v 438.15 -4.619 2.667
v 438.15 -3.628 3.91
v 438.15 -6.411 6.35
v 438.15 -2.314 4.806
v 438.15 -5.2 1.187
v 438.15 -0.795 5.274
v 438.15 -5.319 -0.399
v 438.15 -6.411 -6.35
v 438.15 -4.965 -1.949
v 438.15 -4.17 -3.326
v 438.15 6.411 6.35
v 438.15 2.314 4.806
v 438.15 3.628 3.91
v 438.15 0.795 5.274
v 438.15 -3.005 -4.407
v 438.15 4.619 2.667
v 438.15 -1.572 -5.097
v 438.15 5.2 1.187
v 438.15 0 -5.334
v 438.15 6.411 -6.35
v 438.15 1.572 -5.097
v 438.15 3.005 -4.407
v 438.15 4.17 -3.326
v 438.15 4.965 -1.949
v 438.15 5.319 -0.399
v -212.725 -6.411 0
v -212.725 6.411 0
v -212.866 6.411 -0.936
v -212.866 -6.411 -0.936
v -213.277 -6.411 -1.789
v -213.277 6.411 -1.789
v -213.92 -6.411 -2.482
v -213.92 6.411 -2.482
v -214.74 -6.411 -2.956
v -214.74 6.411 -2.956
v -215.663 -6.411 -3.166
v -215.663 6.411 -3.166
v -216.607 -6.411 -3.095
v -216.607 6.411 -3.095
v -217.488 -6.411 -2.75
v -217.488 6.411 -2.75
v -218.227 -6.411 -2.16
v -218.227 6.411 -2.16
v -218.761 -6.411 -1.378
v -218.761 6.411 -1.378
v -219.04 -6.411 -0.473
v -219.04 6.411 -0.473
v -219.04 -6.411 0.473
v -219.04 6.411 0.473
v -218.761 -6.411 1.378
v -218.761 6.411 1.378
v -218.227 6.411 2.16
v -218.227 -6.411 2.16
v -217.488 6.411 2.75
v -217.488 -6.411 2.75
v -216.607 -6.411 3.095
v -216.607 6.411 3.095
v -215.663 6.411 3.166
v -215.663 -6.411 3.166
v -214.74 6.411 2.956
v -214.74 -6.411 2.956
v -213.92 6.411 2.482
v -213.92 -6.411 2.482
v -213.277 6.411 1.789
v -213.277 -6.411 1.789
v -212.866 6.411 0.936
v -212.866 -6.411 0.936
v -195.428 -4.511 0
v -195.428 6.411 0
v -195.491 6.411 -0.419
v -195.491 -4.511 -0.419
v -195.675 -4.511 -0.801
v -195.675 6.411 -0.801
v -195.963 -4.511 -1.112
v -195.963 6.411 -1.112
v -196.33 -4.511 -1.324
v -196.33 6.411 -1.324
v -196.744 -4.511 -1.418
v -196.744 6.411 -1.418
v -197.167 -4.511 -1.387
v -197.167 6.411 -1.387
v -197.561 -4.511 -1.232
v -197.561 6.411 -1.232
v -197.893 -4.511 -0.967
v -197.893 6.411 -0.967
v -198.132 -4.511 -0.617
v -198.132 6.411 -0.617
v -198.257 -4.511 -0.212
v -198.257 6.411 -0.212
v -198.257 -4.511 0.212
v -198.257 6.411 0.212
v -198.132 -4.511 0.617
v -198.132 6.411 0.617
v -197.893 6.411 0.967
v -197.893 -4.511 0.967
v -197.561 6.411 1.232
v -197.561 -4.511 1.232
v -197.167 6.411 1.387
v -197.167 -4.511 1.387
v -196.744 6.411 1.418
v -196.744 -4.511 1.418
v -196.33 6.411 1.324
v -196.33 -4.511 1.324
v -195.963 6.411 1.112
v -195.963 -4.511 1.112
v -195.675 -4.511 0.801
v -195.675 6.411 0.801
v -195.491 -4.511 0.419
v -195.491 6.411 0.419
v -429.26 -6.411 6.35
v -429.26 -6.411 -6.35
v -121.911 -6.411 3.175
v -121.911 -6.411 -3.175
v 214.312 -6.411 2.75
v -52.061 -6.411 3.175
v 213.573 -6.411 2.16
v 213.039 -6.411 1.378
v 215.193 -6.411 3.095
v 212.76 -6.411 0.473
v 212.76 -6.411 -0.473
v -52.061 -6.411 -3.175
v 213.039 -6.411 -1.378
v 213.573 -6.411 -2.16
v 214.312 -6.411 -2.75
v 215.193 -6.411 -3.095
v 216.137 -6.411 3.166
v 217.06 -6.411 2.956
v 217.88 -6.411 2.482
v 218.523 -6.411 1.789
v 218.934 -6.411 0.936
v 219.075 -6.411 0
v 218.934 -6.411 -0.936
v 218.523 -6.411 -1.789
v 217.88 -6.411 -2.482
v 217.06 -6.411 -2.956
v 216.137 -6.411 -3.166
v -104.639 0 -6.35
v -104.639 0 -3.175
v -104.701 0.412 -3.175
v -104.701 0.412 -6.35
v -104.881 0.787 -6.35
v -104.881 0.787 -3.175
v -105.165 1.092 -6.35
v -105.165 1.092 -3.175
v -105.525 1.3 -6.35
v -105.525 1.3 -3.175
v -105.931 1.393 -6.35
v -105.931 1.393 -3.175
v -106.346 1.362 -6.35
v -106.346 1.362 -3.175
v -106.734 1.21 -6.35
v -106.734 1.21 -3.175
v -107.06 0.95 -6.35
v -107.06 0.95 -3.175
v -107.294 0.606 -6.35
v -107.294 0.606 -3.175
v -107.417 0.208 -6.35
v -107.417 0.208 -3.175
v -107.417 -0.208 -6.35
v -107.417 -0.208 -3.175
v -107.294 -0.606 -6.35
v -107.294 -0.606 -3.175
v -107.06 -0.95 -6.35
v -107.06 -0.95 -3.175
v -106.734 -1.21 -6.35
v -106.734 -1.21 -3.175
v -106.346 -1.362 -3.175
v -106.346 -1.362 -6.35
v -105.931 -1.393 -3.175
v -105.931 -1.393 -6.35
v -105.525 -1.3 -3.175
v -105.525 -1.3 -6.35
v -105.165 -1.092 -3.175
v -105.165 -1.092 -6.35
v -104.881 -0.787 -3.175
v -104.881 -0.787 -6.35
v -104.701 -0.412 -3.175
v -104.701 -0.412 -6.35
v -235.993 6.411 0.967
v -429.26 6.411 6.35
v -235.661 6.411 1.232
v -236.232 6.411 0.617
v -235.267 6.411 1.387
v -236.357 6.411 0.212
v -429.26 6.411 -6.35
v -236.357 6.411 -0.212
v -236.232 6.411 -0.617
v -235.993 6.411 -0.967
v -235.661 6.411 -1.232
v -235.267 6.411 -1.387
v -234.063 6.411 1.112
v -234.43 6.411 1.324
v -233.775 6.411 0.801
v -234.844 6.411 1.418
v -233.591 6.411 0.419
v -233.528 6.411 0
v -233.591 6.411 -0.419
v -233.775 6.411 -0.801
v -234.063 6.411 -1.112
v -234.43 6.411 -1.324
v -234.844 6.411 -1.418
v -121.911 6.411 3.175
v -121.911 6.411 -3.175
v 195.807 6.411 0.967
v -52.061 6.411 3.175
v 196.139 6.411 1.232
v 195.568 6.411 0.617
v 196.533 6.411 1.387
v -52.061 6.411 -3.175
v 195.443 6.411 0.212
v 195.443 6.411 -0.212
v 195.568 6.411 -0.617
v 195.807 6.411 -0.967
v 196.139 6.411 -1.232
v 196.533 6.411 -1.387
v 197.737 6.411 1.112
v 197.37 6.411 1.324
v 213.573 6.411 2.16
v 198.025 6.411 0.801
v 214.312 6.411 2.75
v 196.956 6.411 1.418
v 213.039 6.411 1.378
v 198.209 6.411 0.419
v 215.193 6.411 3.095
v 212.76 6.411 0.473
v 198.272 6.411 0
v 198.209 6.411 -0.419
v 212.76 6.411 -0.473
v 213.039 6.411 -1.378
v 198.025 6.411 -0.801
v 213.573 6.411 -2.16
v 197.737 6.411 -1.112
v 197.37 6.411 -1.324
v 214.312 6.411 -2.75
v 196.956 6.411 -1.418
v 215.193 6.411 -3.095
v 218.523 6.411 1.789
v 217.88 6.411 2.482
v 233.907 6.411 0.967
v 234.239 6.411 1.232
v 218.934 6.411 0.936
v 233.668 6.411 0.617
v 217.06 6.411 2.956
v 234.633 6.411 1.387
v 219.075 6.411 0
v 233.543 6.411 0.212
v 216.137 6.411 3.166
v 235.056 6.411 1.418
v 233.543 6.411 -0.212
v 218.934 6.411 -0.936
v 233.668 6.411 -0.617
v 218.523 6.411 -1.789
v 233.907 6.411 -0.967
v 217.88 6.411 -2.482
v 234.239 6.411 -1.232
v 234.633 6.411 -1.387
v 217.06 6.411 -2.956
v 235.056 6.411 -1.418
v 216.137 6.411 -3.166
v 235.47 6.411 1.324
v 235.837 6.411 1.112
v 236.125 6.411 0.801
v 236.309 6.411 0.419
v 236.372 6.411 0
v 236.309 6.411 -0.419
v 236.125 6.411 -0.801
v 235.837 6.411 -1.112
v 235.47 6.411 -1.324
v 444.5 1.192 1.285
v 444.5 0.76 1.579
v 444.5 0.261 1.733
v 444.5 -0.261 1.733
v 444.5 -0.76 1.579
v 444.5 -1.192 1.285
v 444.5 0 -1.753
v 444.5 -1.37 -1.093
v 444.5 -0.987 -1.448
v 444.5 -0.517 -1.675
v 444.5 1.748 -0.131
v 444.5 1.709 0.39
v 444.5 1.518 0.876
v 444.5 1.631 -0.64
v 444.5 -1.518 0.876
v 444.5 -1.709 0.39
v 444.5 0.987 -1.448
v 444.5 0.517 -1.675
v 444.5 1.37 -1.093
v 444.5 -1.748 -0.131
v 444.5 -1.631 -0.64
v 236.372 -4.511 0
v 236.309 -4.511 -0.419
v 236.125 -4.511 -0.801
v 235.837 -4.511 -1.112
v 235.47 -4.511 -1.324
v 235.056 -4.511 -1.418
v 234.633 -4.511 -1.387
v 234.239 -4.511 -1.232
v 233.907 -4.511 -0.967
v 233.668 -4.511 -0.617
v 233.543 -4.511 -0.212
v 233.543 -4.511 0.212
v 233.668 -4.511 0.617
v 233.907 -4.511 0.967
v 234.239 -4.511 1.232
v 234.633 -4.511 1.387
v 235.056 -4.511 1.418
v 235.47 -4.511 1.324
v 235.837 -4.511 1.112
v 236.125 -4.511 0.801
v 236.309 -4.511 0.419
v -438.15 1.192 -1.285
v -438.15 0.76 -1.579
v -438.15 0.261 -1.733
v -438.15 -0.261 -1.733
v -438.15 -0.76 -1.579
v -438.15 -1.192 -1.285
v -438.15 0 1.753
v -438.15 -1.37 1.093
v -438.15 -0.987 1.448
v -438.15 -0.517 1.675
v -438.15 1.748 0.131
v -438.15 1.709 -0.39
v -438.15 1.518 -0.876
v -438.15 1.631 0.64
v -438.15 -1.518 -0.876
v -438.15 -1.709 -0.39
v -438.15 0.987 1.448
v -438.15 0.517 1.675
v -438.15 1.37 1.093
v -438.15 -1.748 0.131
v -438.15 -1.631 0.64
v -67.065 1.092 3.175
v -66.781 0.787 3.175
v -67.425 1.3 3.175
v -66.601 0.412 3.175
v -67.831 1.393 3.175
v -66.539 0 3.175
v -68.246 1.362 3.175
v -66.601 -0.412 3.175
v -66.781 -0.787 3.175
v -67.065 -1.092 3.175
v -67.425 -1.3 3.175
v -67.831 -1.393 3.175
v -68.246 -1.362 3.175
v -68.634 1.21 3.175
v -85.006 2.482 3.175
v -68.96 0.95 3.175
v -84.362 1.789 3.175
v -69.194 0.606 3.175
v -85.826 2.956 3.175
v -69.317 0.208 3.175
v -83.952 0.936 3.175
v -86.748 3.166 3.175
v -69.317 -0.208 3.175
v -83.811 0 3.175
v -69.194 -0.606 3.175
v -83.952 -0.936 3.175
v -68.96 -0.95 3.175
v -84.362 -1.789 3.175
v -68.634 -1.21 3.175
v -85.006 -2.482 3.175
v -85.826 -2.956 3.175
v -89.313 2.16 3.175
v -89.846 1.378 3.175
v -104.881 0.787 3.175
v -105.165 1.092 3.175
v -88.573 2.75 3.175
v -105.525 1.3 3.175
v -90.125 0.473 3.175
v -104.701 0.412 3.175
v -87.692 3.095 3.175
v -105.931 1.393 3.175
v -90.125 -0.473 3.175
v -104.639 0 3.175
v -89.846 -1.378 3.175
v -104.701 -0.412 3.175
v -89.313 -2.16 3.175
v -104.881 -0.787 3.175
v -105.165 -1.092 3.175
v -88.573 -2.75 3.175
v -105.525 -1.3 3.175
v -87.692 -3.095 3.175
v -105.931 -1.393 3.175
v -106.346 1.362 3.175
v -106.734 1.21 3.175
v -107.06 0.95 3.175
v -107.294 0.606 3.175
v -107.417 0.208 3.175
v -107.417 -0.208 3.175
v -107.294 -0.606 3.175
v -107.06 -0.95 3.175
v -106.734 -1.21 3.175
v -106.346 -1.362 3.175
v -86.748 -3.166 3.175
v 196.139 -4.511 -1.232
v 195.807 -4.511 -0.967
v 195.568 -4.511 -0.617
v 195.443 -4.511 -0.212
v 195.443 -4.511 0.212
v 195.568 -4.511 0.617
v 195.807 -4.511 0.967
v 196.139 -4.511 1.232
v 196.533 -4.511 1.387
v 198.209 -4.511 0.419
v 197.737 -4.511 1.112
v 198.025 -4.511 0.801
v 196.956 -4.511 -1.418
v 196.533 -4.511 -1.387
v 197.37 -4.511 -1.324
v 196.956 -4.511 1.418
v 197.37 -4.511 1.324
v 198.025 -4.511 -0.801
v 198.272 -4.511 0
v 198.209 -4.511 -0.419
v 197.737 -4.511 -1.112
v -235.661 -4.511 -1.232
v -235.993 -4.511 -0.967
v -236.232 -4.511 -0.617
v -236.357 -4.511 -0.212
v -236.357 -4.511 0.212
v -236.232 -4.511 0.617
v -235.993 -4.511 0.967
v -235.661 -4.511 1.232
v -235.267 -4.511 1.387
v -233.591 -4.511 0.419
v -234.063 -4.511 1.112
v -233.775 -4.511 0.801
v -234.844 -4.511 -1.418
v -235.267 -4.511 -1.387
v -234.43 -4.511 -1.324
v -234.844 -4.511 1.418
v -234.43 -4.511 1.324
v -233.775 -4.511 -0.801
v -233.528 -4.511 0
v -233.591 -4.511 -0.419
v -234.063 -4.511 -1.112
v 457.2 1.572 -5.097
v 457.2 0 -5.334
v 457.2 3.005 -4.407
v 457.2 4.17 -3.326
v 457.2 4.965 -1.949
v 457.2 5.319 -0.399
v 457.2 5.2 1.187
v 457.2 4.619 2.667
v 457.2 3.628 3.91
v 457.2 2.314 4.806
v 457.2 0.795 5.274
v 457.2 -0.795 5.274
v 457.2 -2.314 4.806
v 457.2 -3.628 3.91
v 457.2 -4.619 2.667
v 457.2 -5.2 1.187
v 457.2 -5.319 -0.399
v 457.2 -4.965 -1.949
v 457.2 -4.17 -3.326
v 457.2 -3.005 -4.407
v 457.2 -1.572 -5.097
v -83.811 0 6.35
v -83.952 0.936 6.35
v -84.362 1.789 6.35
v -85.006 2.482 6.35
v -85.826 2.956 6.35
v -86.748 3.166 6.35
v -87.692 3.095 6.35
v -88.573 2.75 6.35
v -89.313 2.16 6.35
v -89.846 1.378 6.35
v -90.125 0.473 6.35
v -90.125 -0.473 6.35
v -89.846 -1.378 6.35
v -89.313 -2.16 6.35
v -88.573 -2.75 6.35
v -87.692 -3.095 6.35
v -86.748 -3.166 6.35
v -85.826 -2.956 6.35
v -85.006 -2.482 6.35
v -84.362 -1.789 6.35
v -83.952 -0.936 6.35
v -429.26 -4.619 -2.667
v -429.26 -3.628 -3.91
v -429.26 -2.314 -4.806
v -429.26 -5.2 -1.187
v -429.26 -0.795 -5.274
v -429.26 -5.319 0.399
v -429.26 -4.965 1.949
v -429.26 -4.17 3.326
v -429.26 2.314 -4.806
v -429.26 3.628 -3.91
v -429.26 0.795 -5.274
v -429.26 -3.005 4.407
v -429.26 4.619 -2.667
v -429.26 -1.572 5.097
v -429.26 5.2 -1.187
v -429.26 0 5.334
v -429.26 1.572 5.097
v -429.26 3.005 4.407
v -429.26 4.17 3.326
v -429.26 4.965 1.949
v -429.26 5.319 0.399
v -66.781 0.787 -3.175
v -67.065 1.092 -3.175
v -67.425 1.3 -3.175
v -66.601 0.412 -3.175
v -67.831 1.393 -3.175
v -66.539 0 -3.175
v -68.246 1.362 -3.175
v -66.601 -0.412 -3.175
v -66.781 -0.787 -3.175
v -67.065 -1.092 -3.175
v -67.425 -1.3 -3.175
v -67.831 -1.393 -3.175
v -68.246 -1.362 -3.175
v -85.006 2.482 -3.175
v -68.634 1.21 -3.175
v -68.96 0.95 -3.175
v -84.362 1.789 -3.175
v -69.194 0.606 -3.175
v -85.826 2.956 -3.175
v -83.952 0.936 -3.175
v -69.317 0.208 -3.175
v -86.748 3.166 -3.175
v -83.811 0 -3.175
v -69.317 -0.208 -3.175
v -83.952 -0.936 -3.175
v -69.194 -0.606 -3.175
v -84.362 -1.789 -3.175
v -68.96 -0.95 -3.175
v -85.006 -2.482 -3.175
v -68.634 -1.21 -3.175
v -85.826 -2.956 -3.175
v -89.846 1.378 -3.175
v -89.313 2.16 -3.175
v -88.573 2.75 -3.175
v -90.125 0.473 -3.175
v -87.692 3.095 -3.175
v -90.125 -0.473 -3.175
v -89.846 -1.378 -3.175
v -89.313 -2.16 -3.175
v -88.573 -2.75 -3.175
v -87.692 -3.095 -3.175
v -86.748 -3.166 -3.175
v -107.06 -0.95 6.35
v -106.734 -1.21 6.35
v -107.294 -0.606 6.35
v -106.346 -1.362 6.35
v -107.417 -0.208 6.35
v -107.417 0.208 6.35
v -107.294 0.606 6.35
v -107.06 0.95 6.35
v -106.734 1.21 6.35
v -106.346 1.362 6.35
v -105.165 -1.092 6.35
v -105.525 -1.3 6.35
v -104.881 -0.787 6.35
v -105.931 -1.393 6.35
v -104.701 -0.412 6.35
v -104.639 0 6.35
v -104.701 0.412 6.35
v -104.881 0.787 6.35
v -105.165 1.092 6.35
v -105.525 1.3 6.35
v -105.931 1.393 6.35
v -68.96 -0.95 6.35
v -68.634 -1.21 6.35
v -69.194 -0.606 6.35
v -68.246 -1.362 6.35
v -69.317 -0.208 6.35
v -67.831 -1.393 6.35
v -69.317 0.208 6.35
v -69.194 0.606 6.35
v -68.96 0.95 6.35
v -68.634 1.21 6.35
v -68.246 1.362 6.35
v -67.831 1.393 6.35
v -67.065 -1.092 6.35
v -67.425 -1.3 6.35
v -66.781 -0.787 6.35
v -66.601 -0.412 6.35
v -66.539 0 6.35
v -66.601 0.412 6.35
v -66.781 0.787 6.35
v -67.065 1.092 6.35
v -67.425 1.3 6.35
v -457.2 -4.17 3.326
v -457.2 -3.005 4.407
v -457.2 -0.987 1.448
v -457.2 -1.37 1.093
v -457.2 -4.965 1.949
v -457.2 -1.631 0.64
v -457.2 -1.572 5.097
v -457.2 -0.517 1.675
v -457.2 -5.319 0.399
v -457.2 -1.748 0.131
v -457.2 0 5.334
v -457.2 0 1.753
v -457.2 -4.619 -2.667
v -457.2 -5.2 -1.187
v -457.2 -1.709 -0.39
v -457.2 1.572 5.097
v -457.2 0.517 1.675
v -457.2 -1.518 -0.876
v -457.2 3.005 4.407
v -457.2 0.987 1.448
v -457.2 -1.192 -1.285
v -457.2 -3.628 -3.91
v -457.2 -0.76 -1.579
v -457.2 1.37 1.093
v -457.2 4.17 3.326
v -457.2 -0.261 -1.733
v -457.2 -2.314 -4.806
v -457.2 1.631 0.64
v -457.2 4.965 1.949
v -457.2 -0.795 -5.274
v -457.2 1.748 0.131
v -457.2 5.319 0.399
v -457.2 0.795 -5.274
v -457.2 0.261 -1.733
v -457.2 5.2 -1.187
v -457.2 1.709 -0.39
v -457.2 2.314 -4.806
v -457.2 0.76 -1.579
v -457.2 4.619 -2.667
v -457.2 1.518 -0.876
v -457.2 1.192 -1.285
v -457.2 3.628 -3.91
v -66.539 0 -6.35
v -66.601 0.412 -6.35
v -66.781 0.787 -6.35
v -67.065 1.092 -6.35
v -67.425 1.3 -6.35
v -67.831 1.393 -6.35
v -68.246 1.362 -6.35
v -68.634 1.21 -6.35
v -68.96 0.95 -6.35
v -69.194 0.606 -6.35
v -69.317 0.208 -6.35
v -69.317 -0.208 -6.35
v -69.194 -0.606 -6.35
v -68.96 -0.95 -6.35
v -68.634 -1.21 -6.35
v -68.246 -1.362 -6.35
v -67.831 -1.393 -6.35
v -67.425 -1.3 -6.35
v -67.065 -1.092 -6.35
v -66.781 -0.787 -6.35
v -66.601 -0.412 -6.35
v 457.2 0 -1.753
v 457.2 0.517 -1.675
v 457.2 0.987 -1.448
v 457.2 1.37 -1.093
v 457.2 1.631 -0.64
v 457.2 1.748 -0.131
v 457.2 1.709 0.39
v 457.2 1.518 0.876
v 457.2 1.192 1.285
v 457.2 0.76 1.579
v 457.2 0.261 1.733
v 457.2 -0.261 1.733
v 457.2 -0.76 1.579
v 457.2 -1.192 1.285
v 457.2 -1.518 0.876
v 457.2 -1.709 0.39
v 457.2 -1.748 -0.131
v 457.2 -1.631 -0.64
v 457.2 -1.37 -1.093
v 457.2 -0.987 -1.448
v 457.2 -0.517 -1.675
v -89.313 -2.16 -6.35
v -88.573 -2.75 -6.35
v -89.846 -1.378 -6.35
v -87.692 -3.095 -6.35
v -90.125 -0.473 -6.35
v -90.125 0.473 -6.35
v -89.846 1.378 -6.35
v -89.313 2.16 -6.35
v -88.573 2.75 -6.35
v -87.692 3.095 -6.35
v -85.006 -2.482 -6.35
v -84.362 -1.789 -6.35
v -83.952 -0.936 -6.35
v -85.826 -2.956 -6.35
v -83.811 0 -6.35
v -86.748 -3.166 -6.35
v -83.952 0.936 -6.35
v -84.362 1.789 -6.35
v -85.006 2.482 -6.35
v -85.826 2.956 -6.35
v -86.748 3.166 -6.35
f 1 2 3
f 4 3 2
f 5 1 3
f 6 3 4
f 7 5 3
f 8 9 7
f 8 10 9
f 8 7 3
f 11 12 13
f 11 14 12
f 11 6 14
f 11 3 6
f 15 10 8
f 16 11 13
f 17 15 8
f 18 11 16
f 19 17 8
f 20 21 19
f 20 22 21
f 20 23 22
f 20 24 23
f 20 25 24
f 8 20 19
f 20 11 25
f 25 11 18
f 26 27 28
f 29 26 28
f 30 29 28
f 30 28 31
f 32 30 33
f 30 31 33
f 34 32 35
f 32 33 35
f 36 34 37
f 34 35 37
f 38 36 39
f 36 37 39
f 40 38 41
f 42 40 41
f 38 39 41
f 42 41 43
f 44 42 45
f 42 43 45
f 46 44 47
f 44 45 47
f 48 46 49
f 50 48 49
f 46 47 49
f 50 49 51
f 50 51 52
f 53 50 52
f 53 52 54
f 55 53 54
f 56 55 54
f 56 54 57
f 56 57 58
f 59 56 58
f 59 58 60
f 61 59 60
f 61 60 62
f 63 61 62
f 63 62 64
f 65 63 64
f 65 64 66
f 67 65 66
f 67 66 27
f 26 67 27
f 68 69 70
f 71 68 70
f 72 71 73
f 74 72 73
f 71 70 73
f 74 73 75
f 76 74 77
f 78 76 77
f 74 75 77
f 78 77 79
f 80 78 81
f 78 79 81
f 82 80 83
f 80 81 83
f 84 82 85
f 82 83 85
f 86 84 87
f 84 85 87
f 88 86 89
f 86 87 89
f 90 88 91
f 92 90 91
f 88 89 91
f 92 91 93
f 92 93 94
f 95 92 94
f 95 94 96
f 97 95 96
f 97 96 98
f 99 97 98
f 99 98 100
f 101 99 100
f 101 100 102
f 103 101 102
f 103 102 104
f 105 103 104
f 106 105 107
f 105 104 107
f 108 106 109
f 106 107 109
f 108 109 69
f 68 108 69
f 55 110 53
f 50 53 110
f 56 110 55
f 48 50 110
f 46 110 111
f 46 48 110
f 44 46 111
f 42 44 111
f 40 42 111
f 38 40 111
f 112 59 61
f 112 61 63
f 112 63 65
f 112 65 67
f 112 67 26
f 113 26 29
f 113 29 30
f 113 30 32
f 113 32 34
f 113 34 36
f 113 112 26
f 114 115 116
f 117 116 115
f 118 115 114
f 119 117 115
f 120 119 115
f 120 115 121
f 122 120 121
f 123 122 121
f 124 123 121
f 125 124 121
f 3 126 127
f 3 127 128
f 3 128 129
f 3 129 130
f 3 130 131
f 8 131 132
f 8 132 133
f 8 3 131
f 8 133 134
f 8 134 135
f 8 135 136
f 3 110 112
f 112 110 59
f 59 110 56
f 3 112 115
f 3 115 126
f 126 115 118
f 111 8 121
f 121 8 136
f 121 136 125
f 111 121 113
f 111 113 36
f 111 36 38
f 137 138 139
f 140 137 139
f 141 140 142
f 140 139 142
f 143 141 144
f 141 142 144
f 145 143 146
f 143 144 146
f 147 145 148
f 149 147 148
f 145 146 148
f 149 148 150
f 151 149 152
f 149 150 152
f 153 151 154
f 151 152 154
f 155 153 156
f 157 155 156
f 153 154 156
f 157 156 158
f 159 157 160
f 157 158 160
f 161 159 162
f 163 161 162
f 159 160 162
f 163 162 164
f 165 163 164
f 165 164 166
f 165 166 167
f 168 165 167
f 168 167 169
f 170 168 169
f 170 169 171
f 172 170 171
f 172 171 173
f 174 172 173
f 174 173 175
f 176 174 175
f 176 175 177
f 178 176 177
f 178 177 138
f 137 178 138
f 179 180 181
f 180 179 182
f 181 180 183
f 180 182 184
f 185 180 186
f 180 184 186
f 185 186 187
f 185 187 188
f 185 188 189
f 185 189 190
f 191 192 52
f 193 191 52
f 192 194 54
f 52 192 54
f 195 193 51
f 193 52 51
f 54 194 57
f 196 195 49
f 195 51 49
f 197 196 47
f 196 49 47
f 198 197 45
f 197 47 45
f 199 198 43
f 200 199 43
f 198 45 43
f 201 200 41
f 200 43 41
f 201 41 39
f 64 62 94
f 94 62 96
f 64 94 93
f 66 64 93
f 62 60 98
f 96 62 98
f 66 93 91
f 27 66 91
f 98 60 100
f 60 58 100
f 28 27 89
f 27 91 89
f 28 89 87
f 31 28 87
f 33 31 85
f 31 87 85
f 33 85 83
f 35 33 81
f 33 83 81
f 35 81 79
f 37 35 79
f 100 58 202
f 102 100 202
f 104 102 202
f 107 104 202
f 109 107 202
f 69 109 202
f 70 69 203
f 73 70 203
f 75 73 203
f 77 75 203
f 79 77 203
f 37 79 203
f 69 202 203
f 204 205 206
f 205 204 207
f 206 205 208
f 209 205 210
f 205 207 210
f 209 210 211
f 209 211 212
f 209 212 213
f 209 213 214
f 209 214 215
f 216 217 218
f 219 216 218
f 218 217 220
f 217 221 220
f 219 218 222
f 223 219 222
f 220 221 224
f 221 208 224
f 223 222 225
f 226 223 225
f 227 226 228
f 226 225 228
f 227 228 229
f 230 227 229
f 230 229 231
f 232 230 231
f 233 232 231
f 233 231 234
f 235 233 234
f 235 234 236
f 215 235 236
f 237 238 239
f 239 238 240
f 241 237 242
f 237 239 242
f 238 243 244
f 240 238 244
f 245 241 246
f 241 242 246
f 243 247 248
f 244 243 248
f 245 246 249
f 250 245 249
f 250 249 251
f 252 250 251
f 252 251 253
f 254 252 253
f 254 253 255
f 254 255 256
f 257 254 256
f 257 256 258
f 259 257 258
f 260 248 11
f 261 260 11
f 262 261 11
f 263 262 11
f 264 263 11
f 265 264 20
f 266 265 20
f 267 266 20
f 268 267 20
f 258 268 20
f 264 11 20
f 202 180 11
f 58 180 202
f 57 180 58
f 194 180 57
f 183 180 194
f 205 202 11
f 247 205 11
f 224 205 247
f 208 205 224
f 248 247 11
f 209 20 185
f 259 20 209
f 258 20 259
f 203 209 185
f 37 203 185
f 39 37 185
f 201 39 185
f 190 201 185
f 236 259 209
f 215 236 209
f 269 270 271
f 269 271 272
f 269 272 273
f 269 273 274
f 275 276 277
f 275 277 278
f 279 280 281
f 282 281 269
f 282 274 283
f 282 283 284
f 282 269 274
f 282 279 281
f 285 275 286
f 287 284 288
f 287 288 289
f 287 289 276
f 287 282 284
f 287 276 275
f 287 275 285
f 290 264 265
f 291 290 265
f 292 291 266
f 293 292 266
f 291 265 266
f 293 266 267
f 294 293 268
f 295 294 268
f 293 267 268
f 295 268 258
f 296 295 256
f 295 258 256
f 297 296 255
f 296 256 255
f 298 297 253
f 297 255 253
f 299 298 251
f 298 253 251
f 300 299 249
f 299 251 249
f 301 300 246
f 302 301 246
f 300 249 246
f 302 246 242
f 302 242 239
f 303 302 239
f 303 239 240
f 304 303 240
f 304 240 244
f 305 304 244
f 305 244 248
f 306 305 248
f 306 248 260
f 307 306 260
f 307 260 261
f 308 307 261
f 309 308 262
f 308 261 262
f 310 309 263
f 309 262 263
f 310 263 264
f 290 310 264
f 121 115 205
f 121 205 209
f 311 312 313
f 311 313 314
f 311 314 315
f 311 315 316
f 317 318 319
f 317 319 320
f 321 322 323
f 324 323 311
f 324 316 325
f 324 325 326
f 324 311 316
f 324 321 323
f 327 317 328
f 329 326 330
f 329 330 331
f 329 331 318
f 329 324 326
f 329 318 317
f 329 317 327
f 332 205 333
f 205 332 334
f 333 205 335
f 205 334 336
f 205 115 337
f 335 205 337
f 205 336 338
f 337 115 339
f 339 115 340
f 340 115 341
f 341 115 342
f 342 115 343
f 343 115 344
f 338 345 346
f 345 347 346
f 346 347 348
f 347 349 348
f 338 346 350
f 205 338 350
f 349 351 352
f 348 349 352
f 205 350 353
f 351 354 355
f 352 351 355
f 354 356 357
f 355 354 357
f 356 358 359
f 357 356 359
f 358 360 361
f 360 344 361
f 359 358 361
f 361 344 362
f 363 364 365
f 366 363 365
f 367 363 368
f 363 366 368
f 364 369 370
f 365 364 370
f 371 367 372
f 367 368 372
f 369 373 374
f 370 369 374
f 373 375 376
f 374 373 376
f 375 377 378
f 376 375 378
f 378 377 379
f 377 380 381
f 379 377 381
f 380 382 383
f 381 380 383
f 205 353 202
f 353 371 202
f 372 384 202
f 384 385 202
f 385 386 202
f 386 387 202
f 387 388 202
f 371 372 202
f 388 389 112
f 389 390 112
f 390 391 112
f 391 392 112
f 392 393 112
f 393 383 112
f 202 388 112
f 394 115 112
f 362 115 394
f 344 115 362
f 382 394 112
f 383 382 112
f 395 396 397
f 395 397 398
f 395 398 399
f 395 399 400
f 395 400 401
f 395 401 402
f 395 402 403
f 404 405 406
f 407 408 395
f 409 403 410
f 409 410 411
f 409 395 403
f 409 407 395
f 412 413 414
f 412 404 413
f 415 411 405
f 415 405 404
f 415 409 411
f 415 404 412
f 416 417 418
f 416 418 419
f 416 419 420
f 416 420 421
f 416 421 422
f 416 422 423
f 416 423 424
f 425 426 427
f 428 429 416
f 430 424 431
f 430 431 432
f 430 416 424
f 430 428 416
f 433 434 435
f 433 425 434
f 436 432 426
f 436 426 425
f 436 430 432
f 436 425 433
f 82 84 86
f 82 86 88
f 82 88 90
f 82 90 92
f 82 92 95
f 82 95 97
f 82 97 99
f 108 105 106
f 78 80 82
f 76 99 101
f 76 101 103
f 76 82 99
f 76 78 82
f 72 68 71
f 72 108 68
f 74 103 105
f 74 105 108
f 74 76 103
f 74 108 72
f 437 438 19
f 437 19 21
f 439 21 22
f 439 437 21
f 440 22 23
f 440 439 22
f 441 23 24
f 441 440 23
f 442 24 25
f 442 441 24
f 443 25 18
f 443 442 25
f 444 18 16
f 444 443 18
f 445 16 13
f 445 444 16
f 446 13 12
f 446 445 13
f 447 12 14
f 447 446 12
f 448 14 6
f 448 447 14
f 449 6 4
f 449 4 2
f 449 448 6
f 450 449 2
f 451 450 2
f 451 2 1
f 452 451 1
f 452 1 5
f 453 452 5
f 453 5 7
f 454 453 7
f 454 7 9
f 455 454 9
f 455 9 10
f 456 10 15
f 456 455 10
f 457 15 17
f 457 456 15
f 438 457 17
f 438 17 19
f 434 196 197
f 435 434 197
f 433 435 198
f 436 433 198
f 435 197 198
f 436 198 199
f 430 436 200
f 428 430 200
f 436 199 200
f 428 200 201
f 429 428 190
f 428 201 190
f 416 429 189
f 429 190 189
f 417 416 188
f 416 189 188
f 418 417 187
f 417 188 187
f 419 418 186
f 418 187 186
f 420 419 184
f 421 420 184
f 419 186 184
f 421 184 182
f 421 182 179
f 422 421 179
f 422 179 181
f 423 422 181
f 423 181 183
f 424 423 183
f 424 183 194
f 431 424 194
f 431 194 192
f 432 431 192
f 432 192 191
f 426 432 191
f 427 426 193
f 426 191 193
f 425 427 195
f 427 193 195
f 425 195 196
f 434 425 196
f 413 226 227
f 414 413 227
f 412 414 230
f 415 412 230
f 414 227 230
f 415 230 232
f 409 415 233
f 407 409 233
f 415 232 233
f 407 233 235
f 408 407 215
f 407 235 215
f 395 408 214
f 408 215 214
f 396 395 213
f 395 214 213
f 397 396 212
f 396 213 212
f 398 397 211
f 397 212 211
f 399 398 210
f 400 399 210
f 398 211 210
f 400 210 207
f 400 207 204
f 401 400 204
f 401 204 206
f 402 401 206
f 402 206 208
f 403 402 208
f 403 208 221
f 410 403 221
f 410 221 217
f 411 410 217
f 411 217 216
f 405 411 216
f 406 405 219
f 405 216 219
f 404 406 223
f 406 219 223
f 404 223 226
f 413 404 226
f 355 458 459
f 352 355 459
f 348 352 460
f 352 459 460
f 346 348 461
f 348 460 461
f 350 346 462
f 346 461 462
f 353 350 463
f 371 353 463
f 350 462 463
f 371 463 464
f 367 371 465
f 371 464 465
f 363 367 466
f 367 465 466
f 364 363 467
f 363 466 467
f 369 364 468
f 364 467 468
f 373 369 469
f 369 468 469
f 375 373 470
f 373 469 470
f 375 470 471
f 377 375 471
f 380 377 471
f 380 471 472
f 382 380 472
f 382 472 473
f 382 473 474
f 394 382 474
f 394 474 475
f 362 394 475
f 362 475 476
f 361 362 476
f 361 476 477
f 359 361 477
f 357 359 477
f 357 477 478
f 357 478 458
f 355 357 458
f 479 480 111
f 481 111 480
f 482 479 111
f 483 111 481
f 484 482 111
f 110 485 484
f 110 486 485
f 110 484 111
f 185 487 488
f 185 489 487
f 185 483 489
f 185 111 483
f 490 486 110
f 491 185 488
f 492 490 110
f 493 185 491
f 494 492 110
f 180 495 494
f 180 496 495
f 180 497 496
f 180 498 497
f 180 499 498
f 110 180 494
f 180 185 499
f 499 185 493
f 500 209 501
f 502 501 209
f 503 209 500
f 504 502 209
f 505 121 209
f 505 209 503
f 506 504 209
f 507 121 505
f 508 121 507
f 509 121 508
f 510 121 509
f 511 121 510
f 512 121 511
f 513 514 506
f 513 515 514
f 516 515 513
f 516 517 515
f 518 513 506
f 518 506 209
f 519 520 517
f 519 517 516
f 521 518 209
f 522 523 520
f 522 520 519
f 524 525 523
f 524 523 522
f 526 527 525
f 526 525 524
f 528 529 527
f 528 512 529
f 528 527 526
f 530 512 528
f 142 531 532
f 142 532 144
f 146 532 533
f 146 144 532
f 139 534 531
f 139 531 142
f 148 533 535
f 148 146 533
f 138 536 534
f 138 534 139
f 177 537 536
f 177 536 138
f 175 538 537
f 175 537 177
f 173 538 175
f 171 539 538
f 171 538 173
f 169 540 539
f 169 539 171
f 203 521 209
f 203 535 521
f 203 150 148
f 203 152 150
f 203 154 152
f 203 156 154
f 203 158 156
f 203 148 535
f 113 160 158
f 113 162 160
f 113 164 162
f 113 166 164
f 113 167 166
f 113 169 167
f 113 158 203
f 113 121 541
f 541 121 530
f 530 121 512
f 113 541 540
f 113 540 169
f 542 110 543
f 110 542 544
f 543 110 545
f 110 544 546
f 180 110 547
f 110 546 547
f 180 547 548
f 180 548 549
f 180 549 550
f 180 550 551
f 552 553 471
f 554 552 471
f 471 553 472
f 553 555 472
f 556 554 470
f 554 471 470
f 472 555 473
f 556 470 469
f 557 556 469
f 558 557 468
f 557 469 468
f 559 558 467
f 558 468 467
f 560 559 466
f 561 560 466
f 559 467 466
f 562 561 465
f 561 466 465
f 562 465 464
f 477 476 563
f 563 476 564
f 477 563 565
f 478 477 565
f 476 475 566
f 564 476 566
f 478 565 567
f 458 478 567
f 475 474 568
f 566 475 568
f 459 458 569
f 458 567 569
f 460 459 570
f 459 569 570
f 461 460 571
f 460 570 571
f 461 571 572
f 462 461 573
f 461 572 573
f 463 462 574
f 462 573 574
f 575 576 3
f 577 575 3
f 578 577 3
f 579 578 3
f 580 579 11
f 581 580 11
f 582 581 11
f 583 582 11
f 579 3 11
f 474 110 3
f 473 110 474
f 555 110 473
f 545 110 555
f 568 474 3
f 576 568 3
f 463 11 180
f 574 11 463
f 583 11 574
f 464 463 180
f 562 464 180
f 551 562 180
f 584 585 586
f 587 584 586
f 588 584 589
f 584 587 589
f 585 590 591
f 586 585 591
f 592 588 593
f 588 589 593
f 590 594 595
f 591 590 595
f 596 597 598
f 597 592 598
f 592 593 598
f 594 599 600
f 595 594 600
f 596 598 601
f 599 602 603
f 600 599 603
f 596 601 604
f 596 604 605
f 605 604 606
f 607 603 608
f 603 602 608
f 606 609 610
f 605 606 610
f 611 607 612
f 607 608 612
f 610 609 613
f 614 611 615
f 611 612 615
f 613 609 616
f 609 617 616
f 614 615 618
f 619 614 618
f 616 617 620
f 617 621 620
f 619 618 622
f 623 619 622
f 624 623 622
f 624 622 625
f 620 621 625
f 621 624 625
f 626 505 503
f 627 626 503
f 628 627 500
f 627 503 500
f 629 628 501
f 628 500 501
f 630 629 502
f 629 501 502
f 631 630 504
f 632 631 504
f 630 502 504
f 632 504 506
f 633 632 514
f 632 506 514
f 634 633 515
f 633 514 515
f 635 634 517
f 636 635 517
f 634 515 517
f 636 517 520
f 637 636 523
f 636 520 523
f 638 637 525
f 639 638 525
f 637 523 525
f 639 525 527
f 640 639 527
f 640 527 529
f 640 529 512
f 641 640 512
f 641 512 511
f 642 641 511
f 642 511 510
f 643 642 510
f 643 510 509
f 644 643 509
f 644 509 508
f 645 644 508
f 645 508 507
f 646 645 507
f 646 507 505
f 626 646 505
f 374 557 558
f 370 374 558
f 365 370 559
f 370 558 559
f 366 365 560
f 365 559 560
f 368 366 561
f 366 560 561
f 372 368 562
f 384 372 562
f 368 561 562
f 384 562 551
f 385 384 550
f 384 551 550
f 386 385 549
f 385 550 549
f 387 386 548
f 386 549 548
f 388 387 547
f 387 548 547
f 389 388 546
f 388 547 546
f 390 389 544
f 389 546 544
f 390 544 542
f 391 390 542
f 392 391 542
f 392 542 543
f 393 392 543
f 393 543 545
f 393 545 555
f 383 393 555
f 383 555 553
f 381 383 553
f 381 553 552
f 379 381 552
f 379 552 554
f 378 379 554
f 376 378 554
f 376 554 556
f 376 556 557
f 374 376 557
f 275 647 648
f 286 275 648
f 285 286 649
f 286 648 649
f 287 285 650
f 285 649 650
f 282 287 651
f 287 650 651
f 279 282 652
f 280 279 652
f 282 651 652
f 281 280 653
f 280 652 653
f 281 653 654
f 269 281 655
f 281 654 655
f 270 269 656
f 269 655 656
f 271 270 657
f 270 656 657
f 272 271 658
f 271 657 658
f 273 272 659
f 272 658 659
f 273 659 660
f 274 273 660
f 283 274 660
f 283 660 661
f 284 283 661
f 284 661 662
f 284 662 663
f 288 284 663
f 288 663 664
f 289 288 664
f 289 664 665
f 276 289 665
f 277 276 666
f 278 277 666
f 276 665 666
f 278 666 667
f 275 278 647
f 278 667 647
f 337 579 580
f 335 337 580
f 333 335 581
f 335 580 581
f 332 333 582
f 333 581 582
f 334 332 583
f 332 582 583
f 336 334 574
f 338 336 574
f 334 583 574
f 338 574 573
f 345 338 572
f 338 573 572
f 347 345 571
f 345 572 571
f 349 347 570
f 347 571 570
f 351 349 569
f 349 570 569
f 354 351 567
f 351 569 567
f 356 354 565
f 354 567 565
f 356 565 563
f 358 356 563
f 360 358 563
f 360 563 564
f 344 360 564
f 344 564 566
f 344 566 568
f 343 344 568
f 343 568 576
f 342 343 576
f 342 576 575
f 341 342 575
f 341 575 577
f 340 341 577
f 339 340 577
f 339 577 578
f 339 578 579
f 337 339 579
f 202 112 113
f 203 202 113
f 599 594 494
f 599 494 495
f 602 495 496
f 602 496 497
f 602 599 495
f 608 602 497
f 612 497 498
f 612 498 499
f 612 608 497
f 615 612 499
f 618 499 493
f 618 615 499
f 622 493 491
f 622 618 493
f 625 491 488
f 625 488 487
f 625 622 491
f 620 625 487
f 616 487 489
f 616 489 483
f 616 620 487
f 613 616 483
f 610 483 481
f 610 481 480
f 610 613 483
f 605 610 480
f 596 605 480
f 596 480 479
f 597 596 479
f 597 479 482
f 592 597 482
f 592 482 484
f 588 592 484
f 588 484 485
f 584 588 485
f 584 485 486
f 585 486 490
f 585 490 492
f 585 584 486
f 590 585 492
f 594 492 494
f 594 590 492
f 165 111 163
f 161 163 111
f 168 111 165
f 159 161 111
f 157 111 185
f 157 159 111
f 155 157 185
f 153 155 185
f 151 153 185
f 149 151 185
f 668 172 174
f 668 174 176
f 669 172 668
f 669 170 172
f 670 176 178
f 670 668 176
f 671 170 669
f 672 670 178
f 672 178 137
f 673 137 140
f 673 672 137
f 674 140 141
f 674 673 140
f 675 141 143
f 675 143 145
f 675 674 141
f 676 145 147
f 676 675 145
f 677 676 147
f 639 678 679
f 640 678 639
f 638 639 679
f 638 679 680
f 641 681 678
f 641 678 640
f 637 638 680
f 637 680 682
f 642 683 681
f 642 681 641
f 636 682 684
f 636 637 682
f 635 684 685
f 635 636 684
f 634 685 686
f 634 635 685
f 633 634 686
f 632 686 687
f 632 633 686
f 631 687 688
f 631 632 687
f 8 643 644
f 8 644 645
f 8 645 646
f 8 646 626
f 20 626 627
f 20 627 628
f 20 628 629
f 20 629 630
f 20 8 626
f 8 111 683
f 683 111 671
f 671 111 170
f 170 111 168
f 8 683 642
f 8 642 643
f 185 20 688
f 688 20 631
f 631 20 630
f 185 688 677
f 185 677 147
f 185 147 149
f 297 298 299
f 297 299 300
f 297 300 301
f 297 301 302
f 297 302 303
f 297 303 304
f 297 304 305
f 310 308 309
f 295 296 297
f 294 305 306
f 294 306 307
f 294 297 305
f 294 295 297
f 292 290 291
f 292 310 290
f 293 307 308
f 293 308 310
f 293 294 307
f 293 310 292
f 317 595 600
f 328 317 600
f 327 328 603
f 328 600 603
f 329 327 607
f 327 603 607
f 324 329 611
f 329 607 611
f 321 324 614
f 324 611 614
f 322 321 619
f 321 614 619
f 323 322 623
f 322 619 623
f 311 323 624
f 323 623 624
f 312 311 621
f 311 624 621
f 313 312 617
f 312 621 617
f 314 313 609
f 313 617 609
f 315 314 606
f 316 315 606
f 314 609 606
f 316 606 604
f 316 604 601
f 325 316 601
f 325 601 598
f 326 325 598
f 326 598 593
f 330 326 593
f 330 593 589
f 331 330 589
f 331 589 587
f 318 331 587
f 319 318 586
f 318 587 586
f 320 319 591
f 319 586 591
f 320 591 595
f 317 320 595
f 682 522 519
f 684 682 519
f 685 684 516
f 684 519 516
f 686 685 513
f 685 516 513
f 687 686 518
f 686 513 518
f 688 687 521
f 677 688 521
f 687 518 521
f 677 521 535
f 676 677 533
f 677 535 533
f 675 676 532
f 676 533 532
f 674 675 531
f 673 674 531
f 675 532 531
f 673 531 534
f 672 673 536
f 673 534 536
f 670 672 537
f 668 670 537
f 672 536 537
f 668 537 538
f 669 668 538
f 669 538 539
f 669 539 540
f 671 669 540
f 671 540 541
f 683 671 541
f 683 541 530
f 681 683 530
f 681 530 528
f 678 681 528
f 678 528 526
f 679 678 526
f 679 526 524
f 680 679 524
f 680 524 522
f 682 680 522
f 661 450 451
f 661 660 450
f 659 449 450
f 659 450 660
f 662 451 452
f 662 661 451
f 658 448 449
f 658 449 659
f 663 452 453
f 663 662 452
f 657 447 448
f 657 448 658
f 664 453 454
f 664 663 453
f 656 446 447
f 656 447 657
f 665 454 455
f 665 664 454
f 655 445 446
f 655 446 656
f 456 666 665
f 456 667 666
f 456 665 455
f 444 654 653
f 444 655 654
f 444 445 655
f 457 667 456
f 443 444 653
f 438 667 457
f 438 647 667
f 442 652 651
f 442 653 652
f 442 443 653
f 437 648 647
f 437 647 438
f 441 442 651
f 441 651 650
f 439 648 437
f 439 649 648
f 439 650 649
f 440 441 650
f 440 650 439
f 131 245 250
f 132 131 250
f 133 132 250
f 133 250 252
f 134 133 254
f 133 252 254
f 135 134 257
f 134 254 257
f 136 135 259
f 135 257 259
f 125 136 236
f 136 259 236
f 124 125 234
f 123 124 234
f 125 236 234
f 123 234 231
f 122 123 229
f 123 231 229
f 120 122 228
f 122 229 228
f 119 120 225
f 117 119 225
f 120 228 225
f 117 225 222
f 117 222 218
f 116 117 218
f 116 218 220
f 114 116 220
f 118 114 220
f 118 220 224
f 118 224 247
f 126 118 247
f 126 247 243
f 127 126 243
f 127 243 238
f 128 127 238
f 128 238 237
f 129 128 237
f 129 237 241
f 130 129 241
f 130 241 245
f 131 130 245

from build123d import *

# Parameters (mm, degrees)
SKETCH1_W                       = 12.7
SKETCH1_H                       = 12.82133758
LENGTH_DEPTH                    = 457.2
SKETCH2_W                       = 12.7
SKETCH2_H                       = 12.82133758
SKETCH2_R                       = 5.334
ROUND_CUT_1_DEPTH               = 19.05
SKETCH3_W                       = 12.7
SKETCH3_H                       = 12.82133758
SKETCH3_R                       = 5.334
ROUND_CUT_2_DEPTH               = 27.94
SKETCH14_R                      = 1.7526
CUT_EXTRUDE6_DEPTH              = 12.7
SKETCH15_R                      = 1.7526
CUT_EXTRUDE7_DEPTH              = 19.05
BOTTOM_WASHER_R                 = 1.4224
BOTTOM_WASHER_BOLTS_DEPTH       = 10.922
BOTTOM_WASHER_CENTER_BOLT_REACH = 14.821
SKETCH18_R                      = 3.175
TOP_WASHER_CENTER_BOLT_REACH    = 14.821
SKETCH17_R                      = 3.175
SKETCH16_R                      = 1.4224
TOP_WASHER_DEPTH                = 10.922
SKETCH19_W                      = 69.85
SKETCH19_H                      = 6.35
CUT_EXTRUDE8_DEPTH              = 13.82133758
SKETCH20_R                      = 1.397
SKETCH20_R_2                    = 3.175
CUT_EXTRUDE9_DEPTH              = 13.7


with BuildPart() as part:
    # Sketch1 → Length (new body, symmetric)
    with BuildSketch(Plane(origin=(0, 0, 0), x_dir=(0, 0, -1), z_dir=(1, 0, 0))):
        Rectangle(SKETCH1_W, SKETCH1_H)
    extrude(amount=LENGTH_DEPTH, both=True)

    # Sketch2 → Round Cut 1 (cut)
    with BuildSketch(Plane(origin=(457.2, 0, 0), x_dir=(0, 0, -1), z_dir=(1, 0, 0))):
        Rectangle(SKETCH2_W, SKETCH2_H)
        Circle(SKETCH2_R, mode=Mode.SUBTRACT)
    extrude(amount=-ROUND_CUT_1_DEPTH, mode=Mode.SUBTRACT)

    # Sketch3 → Round Cut 2 (cut)
    with BuildSketch(Plane.ZY.offset(457.2)):
        Rectangle(SKETCH3_W, SKETCH3_H)
        Circle(SKETCH3_R, mode=Mode.SUBTRACT)
    extrude(amount=-ROUND_CUT_2_DEPTH, mode=Mode.SUBTRACT)

    # Sketch14 → Cut-Extrude6 (cut)
    with BuildSketch(Plane(origin=(457.2, 0, 0), x_dir=(0, 0, -1), z_dir=(1, 0, 0))):
        Circle(SKETCH14_R)
    extrude(amount=-CUT_EXTRUDE6_DEPTH, mode=Mode.SUBTRACT)

    # Sketch15 → Cut-Extrude7 (cut)
    with BuildSketch(Plane.ZY.offset(457.2)):
        Circle(SKETCH15_R)
    extrude(amount=-CUT_EXTRUDE7_DEPTH, mode=Mode.SUBTRACT)

    # Bottom Washer → Bottom washer bolts (cut)
    with BuildSketch(Plane(origin=(0, 6.41066879, 0), x_dir=(1, 0, 0), z_dir=(0, 1, 0))):
        with Locations((-196.85, 0)):
            Circle(BOTTOM_WASHER_R)
        with Locations((-234.95, 0)):
            Circle(BOTTOM_WASHER_R)
    extrude(amount=-BOTTOM_WASHER_BOLTS_DEPTH, mode=Mode.SUBTRACT)

    # Sketch18 → Bottom Washer Center Bolt (cut, up to next)
    with BuildSketch(Plane(origin=(0, 6.41066879, 0), x_dir=(1, 0, 0), z_dir=(0, 1, 0)), mode=Mode.PRIVATE) as bottom_washer_center_bolt_sk1:
        with Locations((-215.9, 0)):
            Circle(SKETCH18_R)
    bottom_washer_center_bolt_tool1 = extrude(bottom_washer_center_bolt_sk1.sketch, amount=-BOTTOM_WASHER_CENTER_BOLT_REACH, mode=Mode.PRIVATE) & part.part
    add(bottom_washer_center_bolt_tool1.solids().sort_by_distance((-215.9, 6.410669, 0))[0], mode=Mode.SUBTRACT)

    # Sketch17 → Top Washer Center Bolt (cut, up to next)
    with BuildSketch(Plane(origin=(0, 6.41066879, 0), x_dir=(1, 0, 0), z_dir=(0, 1, 0)), mode=Mode.PRIVATE) as top_washer_center_bolt_sk1:
        with Locations((215.9, 0)):
            Circle(SKETCH17_R)
    top_washer_center_bolt_tool1 = extrude(top_washer_center_bolt_sk1.sketch, amount=-TOP_WASHER_CENTER_BOLT_REACH, mode=Mode.PRIVATE) & part.part
    add(top_washer_center_bolt_tool1.solids().sort_by_distance((215.9, 6.410669, 0))[0], mode=Mode.SUBTRACT)

    # Sketch16 → Top Washer (cut)
    with BuildSketch(Plane(origin=(0, 6.41066879, 0), x_dir=(1, 0, 0), z_dir=(0, 1, 0))):
        with Locations((234.95, 0)):
            Circle(SKETCH16_R)
        with Locations((196.85, 0)):
            Circle(SKETCH16_R)
    extrude(amount=-TOP_WASHER_DEPTH, mode=Mode.SUBTRACT)

    # Sketch19 → Cut-Extrude8 (cut, through all)
    with BuildSketch(Plane(origin=(0, -6.41066879, 0), x_dir=(-1, 0, 0), z_dir=(0, -1, 0))):
        with Locations((86.985602, 0)):
            Rectangle(SKETCH19_W, SKETCH19_H)
    extrude(amount=-CUT_EXTRUDE8_DEPTH, mode=Mode.SUBTRACT)

    # Sketch20 → Cut-Extrude9 (cut, through all)
    with BuildSketch(Plane.XY.offset(6.35)):
        with Locations((-106.035602, 0)):
            Circle(SKETCH20_R)
        with Locations((-86.985602, 0)):
            Circle(SKETCH20_R_2)
        with Locations((-67.935602, 0)):
            Circle(SKETCH20_R)
    extrude(amount=-CUT_EXTRUDE9_DEPTH, mode=Mode.SUBTRACT)


solid = part.part
